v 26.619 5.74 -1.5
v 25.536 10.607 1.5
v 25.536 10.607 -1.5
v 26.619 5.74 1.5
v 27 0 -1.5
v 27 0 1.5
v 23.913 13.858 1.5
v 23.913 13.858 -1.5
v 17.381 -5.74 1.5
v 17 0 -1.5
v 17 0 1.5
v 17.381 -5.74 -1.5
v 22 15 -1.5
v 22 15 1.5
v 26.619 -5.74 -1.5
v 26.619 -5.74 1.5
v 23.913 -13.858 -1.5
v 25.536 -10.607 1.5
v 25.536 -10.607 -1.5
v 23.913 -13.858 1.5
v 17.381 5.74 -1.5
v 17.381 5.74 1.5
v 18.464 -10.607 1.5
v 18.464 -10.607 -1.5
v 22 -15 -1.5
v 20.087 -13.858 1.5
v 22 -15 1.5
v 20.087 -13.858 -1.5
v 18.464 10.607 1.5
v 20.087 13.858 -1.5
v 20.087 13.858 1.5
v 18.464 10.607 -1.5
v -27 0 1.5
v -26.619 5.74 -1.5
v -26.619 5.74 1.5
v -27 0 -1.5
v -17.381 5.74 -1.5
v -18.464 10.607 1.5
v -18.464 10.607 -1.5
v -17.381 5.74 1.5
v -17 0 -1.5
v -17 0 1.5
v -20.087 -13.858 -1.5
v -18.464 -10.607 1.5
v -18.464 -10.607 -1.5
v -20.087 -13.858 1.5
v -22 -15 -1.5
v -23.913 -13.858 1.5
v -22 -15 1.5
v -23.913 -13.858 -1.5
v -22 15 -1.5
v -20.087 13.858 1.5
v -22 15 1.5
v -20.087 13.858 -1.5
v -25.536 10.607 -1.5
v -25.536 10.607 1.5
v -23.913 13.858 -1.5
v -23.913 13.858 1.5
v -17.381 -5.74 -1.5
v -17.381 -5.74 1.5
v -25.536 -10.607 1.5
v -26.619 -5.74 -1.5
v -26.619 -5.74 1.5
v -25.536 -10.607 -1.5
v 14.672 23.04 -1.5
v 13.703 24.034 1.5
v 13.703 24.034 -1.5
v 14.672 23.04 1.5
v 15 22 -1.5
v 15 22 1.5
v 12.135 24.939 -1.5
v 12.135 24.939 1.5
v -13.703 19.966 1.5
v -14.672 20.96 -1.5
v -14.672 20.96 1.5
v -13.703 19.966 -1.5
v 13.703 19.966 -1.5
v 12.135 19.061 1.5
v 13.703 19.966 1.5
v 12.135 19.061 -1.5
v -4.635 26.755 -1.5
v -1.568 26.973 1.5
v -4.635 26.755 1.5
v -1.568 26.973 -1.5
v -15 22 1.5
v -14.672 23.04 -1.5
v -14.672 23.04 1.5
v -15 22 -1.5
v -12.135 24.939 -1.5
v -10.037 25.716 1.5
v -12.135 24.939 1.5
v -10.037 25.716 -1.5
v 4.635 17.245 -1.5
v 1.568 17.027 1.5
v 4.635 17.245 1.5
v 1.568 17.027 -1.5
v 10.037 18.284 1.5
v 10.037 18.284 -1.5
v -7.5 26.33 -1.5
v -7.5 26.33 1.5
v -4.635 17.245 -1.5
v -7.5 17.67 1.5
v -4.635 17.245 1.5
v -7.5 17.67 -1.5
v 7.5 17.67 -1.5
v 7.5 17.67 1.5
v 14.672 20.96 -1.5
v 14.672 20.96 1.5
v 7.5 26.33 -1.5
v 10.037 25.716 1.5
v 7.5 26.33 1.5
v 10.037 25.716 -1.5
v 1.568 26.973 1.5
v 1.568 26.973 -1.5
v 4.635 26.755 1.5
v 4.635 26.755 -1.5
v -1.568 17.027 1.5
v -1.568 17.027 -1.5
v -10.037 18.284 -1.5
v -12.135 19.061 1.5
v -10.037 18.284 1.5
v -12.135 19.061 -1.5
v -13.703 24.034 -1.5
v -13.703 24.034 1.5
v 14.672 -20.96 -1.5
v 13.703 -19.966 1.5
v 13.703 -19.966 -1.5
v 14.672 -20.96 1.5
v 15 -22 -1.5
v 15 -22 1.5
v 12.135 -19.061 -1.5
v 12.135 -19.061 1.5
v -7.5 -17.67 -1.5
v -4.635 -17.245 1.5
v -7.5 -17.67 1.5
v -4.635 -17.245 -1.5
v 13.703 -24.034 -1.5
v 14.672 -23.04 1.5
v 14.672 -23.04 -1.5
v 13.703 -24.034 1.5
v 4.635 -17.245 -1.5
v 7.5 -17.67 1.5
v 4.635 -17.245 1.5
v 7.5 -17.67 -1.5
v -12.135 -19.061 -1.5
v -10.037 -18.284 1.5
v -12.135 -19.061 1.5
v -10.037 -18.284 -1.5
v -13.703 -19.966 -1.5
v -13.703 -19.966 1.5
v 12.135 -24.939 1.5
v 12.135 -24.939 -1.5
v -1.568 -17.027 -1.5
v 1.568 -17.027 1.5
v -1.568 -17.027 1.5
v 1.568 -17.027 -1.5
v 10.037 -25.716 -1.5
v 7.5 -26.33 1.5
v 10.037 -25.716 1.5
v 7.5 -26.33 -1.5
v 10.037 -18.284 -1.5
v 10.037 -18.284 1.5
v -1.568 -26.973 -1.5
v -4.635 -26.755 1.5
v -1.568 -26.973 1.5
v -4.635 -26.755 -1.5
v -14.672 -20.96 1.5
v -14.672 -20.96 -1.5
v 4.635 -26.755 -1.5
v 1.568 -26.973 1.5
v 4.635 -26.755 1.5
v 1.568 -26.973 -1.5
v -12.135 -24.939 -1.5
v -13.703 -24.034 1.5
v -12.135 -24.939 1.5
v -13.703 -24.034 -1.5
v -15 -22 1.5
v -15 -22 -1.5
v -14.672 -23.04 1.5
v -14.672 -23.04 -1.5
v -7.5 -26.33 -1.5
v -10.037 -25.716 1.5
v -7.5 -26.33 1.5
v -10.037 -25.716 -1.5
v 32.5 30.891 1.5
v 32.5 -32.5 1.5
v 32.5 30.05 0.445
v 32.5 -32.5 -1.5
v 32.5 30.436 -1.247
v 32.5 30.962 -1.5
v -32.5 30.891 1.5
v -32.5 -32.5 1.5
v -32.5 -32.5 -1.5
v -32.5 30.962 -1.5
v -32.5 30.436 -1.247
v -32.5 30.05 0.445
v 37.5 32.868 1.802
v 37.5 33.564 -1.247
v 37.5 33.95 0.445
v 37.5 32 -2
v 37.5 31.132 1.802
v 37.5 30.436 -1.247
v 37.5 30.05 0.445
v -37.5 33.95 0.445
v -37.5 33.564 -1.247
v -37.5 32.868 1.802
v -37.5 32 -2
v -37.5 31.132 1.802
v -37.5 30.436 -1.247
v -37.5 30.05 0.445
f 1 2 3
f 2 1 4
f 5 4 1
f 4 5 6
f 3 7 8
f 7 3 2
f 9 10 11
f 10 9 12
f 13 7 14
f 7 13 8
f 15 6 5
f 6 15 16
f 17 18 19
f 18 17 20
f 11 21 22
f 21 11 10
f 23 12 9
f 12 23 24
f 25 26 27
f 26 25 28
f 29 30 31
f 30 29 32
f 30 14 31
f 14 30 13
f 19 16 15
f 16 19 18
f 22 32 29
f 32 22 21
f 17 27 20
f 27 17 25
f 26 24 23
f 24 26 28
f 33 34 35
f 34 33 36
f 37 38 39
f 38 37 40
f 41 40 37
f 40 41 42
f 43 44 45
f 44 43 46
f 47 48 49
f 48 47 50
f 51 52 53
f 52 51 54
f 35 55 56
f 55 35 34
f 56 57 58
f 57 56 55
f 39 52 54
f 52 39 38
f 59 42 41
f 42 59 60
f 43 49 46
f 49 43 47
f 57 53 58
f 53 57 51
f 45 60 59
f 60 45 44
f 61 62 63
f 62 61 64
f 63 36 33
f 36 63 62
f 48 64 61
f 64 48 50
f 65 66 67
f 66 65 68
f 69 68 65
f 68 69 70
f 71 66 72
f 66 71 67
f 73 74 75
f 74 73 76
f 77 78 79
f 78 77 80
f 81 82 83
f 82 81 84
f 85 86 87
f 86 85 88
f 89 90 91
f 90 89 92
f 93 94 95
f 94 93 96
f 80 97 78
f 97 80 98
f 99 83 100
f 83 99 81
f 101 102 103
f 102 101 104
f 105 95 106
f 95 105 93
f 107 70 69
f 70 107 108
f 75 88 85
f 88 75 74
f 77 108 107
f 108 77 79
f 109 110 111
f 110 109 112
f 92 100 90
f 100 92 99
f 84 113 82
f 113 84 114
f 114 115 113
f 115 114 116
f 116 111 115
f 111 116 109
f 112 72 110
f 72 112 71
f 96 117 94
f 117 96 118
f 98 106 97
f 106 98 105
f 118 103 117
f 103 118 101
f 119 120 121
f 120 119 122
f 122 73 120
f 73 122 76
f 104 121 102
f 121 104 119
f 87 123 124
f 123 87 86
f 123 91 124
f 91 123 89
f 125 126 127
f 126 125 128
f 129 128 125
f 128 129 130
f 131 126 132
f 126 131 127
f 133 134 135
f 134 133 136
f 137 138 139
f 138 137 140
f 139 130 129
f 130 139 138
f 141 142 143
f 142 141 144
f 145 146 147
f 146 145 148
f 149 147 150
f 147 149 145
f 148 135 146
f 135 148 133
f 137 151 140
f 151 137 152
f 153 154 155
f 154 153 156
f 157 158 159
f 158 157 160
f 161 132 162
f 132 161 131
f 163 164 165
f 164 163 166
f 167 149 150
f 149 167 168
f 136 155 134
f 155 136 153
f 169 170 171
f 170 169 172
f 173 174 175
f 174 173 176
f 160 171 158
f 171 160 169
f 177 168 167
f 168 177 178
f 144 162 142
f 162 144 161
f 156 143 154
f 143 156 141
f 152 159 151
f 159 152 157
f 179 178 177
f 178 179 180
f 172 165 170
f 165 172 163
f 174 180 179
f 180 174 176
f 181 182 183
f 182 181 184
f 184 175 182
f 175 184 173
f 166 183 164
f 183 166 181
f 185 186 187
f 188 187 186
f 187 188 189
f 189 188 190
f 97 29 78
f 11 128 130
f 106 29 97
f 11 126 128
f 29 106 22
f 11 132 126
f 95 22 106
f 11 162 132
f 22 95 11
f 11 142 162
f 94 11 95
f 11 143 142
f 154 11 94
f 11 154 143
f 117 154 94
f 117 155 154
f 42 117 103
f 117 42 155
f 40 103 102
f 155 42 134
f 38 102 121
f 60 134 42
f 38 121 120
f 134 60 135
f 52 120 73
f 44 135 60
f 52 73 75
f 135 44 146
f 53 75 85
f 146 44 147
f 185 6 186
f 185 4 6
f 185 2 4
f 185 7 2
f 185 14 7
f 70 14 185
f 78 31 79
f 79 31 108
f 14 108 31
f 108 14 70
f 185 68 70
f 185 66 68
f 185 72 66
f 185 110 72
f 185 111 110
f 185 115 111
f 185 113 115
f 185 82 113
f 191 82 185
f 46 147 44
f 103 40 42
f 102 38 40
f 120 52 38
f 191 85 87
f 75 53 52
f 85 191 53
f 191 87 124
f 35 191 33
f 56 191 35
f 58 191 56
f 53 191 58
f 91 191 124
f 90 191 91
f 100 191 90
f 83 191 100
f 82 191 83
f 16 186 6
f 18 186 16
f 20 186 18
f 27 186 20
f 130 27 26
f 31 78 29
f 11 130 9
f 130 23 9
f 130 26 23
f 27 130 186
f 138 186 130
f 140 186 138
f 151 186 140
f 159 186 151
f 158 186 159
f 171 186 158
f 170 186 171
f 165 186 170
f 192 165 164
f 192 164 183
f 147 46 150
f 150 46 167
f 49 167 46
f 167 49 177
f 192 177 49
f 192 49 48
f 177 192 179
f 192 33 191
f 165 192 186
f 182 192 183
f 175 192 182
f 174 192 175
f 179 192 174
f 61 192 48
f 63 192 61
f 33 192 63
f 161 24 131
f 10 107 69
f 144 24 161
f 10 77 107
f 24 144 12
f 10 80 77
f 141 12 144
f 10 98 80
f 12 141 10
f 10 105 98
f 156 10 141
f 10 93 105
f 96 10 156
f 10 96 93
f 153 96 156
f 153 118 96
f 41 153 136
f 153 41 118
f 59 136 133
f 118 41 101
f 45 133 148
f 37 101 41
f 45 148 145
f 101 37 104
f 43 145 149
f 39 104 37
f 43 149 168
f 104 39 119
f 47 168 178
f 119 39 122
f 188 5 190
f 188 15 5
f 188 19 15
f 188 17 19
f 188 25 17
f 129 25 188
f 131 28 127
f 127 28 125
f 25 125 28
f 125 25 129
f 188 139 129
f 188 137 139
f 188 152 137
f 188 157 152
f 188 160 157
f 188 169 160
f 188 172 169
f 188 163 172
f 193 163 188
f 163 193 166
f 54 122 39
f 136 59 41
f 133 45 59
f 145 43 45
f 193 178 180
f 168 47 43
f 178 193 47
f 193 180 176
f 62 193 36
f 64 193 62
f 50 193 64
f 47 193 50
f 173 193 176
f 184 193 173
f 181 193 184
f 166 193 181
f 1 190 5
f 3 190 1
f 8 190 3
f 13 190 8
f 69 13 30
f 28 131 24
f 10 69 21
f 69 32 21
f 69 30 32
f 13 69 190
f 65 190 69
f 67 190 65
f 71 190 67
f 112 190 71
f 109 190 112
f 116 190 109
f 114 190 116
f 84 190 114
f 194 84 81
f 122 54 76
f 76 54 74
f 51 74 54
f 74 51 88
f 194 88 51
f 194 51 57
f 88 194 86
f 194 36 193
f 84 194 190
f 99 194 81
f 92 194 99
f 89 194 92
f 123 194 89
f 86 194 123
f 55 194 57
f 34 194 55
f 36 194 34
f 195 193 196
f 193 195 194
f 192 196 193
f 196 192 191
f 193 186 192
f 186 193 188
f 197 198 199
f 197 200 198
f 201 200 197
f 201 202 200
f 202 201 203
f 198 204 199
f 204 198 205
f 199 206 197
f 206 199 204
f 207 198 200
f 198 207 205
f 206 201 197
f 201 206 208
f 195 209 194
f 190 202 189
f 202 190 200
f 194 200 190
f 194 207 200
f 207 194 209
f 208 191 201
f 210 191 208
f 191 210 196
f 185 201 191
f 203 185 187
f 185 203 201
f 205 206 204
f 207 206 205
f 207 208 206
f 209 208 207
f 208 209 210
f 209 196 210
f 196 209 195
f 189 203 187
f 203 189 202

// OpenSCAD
module oval(w, h, height, center)
{
	scale([1, h/w, 1]) cylinder(h=height, r=w, center=false);
}

module cover()
{
	union()
	{
		difference()
  		{
			cube([65, 65, 3],center = true);
			union()
      		{
				translate([22,0,-2]) oval(5, 15, 10, center = true);
				translate([-22,0,-2]) oval(5, 15, 10, center = true);
				translate([0,22,-2]) oval(15, 5, 10, center = true);
				translate([0,-22,-2]) oval(15, 5, 10, center = true);

			}
		}
		translate([0, 32, 0]) rotate([0,90,0]) cylinder(75, 2, 2, center = true);
	}
}


cover();
